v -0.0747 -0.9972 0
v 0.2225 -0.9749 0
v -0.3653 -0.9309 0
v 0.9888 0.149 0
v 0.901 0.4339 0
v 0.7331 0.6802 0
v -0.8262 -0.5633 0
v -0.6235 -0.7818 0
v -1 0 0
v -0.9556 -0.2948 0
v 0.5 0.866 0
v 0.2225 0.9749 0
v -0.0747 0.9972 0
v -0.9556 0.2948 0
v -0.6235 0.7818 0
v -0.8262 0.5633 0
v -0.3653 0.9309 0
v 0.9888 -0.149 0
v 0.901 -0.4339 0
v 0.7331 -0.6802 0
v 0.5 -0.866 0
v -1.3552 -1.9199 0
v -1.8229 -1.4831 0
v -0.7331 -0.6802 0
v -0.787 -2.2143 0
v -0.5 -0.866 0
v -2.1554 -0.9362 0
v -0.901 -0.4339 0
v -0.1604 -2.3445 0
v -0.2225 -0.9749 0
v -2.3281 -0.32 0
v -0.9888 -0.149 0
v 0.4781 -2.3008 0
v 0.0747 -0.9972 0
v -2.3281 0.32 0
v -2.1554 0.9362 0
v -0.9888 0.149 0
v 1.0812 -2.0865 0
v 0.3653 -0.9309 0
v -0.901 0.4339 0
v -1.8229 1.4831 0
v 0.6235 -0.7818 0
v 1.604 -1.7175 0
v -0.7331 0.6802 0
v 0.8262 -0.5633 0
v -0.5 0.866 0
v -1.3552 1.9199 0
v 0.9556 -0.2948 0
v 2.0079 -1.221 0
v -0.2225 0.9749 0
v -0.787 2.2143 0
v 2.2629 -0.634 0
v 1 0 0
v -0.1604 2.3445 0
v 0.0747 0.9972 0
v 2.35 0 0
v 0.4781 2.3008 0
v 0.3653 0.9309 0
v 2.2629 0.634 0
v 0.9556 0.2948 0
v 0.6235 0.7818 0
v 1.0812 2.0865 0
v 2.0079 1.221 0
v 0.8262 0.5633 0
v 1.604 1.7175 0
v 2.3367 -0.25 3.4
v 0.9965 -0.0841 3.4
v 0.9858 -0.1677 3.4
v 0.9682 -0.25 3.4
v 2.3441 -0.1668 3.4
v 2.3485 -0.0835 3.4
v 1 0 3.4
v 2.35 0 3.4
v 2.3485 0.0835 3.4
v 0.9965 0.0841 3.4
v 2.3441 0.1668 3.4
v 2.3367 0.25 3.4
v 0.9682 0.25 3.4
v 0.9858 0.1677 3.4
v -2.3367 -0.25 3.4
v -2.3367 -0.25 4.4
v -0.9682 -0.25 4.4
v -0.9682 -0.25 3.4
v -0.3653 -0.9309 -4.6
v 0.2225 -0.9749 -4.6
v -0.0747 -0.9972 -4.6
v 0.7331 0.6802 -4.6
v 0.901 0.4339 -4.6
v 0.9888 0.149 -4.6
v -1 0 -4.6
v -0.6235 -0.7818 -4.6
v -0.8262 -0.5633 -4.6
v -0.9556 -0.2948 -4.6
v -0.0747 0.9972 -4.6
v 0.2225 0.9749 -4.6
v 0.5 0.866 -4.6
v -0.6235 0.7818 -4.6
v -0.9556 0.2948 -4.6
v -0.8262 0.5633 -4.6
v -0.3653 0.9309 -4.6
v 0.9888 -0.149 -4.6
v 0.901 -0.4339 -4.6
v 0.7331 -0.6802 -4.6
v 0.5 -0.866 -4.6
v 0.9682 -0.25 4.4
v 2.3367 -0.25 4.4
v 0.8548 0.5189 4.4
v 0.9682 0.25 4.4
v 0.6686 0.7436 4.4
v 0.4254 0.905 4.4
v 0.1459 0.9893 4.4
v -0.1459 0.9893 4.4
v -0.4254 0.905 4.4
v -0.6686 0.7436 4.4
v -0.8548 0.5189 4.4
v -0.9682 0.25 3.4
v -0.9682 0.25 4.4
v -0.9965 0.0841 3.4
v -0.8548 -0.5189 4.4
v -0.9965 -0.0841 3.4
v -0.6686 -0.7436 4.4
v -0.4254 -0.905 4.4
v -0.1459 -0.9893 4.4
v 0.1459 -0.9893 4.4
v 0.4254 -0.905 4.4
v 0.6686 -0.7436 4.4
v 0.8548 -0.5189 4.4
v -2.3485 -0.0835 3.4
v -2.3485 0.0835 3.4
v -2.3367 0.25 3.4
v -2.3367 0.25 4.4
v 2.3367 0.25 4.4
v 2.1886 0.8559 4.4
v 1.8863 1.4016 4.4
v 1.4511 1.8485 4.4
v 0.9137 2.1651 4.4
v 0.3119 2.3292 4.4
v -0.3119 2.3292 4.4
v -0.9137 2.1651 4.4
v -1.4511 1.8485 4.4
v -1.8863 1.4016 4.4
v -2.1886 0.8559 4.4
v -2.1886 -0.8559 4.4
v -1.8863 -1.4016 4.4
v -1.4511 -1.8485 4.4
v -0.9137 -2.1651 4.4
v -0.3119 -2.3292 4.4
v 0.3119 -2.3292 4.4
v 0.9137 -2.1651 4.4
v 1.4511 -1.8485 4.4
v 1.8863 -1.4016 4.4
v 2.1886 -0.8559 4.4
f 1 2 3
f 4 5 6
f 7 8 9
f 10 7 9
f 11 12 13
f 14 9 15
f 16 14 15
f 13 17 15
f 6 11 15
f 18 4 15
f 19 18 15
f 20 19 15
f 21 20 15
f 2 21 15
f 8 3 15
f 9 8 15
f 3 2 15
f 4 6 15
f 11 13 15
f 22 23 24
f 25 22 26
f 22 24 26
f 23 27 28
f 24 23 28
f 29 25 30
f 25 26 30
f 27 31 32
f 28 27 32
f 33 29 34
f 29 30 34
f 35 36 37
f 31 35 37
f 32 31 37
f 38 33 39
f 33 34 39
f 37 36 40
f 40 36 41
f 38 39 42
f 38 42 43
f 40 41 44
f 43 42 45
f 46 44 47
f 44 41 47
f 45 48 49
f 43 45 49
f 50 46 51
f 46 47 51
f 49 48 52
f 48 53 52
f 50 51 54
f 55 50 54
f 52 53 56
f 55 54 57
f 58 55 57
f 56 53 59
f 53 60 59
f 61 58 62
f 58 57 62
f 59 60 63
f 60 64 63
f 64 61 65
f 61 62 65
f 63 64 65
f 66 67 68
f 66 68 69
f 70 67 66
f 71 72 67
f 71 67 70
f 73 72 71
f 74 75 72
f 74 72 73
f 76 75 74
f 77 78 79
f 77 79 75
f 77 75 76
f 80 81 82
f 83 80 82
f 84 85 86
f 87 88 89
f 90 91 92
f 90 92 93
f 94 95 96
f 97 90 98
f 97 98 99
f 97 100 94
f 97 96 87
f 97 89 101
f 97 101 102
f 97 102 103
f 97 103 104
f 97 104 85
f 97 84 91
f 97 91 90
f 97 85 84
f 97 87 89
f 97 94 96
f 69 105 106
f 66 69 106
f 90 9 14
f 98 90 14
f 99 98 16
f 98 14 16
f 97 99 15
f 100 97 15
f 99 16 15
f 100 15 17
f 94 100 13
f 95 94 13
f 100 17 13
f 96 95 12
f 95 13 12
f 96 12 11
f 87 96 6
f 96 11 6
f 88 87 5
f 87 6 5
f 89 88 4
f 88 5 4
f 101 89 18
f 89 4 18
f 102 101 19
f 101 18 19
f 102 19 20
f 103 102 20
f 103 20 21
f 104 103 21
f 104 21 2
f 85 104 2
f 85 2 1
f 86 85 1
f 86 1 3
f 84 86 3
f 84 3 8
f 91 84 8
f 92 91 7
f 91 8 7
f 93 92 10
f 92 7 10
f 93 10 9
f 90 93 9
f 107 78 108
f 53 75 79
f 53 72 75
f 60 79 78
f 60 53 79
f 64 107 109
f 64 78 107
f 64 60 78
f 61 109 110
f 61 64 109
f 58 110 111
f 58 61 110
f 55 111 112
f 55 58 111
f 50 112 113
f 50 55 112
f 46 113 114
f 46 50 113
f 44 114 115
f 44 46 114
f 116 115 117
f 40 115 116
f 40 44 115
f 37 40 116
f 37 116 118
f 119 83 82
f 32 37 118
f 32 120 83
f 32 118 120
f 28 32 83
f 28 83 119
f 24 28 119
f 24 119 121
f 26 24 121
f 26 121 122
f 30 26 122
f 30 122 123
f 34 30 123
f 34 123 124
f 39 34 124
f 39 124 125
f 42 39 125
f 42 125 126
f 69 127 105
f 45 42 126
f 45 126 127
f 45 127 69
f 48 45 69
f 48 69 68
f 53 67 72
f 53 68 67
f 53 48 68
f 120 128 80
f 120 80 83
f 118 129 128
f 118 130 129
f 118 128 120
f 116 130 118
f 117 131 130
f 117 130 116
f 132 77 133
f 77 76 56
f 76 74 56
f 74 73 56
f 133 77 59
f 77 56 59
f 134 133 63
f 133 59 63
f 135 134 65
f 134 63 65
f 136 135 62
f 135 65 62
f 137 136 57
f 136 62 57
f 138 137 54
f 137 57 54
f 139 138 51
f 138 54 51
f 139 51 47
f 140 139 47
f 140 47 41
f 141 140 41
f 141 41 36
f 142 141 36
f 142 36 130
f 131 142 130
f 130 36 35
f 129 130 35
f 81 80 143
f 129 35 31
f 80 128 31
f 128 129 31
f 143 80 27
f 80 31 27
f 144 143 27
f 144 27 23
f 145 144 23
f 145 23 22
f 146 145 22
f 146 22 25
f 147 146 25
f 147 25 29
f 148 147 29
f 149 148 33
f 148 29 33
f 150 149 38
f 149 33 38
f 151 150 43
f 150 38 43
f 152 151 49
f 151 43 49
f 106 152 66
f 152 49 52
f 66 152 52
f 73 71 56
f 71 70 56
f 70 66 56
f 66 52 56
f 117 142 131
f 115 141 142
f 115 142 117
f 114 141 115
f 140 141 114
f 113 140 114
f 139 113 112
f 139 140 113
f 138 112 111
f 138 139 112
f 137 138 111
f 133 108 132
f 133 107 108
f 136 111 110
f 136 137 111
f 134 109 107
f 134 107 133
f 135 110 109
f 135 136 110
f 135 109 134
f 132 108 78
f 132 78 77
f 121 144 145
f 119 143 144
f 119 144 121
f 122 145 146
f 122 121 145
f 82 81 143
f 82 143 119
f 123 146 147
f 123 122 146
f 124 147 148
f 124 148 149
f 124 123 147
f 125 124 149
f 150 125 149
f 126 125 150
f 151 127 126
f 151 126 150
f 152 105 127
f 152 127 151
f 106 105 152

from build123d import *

# Parameters (mm, degrees)
SKETCH_1_R          = 2.35
SKETCH_1_R_2        = 1
EXTRUDE_1_DEPTH     = 4.4
SKETCH_2_W          = 5
SKETCH_2_H          = 0.5
CUT_EXTRUDE_1_DEPTH = 1
SKETCH_3_R          = 1
EXTRUDE_2_DEPTH     = 4.6


with BuildPart() as part:
    # 草图1 → 凸台-拉伸1 (new body)
    with BuildSketch(Plane.XY):
        Circle(SKETCH_1_R)
        Circle(SKETCH_1_R_2, mode=Mode.SUBTRACT)
    extrude(amount=EXTRUDE_1_DEPTH)

    # 草图2 → 切除-拉伸1 (cut)
    with BuildSketch(Plane.XY.offset(4.4)):
        Rectangle(SKETCH_2_W, SKETCH_2_H)
    extrude(amount=-CUT_EXTRUDE_1_DEPTH, mode=Mode.SUBTRACT)


with BuildPart() as body_2:
    # 草图3 → 凸台-拉伸2 (new body)
    with BuildSketch(Plane(origin=(0, 0, 0), x_dir=(-1, 0, 0), z_dir=(0, 0, -1))):
        Circle(SKETCH_3_R)
    extrude(amount=EXTRUDE_2_DEPTH)


solid = Compound([part.part, body_2.part])
